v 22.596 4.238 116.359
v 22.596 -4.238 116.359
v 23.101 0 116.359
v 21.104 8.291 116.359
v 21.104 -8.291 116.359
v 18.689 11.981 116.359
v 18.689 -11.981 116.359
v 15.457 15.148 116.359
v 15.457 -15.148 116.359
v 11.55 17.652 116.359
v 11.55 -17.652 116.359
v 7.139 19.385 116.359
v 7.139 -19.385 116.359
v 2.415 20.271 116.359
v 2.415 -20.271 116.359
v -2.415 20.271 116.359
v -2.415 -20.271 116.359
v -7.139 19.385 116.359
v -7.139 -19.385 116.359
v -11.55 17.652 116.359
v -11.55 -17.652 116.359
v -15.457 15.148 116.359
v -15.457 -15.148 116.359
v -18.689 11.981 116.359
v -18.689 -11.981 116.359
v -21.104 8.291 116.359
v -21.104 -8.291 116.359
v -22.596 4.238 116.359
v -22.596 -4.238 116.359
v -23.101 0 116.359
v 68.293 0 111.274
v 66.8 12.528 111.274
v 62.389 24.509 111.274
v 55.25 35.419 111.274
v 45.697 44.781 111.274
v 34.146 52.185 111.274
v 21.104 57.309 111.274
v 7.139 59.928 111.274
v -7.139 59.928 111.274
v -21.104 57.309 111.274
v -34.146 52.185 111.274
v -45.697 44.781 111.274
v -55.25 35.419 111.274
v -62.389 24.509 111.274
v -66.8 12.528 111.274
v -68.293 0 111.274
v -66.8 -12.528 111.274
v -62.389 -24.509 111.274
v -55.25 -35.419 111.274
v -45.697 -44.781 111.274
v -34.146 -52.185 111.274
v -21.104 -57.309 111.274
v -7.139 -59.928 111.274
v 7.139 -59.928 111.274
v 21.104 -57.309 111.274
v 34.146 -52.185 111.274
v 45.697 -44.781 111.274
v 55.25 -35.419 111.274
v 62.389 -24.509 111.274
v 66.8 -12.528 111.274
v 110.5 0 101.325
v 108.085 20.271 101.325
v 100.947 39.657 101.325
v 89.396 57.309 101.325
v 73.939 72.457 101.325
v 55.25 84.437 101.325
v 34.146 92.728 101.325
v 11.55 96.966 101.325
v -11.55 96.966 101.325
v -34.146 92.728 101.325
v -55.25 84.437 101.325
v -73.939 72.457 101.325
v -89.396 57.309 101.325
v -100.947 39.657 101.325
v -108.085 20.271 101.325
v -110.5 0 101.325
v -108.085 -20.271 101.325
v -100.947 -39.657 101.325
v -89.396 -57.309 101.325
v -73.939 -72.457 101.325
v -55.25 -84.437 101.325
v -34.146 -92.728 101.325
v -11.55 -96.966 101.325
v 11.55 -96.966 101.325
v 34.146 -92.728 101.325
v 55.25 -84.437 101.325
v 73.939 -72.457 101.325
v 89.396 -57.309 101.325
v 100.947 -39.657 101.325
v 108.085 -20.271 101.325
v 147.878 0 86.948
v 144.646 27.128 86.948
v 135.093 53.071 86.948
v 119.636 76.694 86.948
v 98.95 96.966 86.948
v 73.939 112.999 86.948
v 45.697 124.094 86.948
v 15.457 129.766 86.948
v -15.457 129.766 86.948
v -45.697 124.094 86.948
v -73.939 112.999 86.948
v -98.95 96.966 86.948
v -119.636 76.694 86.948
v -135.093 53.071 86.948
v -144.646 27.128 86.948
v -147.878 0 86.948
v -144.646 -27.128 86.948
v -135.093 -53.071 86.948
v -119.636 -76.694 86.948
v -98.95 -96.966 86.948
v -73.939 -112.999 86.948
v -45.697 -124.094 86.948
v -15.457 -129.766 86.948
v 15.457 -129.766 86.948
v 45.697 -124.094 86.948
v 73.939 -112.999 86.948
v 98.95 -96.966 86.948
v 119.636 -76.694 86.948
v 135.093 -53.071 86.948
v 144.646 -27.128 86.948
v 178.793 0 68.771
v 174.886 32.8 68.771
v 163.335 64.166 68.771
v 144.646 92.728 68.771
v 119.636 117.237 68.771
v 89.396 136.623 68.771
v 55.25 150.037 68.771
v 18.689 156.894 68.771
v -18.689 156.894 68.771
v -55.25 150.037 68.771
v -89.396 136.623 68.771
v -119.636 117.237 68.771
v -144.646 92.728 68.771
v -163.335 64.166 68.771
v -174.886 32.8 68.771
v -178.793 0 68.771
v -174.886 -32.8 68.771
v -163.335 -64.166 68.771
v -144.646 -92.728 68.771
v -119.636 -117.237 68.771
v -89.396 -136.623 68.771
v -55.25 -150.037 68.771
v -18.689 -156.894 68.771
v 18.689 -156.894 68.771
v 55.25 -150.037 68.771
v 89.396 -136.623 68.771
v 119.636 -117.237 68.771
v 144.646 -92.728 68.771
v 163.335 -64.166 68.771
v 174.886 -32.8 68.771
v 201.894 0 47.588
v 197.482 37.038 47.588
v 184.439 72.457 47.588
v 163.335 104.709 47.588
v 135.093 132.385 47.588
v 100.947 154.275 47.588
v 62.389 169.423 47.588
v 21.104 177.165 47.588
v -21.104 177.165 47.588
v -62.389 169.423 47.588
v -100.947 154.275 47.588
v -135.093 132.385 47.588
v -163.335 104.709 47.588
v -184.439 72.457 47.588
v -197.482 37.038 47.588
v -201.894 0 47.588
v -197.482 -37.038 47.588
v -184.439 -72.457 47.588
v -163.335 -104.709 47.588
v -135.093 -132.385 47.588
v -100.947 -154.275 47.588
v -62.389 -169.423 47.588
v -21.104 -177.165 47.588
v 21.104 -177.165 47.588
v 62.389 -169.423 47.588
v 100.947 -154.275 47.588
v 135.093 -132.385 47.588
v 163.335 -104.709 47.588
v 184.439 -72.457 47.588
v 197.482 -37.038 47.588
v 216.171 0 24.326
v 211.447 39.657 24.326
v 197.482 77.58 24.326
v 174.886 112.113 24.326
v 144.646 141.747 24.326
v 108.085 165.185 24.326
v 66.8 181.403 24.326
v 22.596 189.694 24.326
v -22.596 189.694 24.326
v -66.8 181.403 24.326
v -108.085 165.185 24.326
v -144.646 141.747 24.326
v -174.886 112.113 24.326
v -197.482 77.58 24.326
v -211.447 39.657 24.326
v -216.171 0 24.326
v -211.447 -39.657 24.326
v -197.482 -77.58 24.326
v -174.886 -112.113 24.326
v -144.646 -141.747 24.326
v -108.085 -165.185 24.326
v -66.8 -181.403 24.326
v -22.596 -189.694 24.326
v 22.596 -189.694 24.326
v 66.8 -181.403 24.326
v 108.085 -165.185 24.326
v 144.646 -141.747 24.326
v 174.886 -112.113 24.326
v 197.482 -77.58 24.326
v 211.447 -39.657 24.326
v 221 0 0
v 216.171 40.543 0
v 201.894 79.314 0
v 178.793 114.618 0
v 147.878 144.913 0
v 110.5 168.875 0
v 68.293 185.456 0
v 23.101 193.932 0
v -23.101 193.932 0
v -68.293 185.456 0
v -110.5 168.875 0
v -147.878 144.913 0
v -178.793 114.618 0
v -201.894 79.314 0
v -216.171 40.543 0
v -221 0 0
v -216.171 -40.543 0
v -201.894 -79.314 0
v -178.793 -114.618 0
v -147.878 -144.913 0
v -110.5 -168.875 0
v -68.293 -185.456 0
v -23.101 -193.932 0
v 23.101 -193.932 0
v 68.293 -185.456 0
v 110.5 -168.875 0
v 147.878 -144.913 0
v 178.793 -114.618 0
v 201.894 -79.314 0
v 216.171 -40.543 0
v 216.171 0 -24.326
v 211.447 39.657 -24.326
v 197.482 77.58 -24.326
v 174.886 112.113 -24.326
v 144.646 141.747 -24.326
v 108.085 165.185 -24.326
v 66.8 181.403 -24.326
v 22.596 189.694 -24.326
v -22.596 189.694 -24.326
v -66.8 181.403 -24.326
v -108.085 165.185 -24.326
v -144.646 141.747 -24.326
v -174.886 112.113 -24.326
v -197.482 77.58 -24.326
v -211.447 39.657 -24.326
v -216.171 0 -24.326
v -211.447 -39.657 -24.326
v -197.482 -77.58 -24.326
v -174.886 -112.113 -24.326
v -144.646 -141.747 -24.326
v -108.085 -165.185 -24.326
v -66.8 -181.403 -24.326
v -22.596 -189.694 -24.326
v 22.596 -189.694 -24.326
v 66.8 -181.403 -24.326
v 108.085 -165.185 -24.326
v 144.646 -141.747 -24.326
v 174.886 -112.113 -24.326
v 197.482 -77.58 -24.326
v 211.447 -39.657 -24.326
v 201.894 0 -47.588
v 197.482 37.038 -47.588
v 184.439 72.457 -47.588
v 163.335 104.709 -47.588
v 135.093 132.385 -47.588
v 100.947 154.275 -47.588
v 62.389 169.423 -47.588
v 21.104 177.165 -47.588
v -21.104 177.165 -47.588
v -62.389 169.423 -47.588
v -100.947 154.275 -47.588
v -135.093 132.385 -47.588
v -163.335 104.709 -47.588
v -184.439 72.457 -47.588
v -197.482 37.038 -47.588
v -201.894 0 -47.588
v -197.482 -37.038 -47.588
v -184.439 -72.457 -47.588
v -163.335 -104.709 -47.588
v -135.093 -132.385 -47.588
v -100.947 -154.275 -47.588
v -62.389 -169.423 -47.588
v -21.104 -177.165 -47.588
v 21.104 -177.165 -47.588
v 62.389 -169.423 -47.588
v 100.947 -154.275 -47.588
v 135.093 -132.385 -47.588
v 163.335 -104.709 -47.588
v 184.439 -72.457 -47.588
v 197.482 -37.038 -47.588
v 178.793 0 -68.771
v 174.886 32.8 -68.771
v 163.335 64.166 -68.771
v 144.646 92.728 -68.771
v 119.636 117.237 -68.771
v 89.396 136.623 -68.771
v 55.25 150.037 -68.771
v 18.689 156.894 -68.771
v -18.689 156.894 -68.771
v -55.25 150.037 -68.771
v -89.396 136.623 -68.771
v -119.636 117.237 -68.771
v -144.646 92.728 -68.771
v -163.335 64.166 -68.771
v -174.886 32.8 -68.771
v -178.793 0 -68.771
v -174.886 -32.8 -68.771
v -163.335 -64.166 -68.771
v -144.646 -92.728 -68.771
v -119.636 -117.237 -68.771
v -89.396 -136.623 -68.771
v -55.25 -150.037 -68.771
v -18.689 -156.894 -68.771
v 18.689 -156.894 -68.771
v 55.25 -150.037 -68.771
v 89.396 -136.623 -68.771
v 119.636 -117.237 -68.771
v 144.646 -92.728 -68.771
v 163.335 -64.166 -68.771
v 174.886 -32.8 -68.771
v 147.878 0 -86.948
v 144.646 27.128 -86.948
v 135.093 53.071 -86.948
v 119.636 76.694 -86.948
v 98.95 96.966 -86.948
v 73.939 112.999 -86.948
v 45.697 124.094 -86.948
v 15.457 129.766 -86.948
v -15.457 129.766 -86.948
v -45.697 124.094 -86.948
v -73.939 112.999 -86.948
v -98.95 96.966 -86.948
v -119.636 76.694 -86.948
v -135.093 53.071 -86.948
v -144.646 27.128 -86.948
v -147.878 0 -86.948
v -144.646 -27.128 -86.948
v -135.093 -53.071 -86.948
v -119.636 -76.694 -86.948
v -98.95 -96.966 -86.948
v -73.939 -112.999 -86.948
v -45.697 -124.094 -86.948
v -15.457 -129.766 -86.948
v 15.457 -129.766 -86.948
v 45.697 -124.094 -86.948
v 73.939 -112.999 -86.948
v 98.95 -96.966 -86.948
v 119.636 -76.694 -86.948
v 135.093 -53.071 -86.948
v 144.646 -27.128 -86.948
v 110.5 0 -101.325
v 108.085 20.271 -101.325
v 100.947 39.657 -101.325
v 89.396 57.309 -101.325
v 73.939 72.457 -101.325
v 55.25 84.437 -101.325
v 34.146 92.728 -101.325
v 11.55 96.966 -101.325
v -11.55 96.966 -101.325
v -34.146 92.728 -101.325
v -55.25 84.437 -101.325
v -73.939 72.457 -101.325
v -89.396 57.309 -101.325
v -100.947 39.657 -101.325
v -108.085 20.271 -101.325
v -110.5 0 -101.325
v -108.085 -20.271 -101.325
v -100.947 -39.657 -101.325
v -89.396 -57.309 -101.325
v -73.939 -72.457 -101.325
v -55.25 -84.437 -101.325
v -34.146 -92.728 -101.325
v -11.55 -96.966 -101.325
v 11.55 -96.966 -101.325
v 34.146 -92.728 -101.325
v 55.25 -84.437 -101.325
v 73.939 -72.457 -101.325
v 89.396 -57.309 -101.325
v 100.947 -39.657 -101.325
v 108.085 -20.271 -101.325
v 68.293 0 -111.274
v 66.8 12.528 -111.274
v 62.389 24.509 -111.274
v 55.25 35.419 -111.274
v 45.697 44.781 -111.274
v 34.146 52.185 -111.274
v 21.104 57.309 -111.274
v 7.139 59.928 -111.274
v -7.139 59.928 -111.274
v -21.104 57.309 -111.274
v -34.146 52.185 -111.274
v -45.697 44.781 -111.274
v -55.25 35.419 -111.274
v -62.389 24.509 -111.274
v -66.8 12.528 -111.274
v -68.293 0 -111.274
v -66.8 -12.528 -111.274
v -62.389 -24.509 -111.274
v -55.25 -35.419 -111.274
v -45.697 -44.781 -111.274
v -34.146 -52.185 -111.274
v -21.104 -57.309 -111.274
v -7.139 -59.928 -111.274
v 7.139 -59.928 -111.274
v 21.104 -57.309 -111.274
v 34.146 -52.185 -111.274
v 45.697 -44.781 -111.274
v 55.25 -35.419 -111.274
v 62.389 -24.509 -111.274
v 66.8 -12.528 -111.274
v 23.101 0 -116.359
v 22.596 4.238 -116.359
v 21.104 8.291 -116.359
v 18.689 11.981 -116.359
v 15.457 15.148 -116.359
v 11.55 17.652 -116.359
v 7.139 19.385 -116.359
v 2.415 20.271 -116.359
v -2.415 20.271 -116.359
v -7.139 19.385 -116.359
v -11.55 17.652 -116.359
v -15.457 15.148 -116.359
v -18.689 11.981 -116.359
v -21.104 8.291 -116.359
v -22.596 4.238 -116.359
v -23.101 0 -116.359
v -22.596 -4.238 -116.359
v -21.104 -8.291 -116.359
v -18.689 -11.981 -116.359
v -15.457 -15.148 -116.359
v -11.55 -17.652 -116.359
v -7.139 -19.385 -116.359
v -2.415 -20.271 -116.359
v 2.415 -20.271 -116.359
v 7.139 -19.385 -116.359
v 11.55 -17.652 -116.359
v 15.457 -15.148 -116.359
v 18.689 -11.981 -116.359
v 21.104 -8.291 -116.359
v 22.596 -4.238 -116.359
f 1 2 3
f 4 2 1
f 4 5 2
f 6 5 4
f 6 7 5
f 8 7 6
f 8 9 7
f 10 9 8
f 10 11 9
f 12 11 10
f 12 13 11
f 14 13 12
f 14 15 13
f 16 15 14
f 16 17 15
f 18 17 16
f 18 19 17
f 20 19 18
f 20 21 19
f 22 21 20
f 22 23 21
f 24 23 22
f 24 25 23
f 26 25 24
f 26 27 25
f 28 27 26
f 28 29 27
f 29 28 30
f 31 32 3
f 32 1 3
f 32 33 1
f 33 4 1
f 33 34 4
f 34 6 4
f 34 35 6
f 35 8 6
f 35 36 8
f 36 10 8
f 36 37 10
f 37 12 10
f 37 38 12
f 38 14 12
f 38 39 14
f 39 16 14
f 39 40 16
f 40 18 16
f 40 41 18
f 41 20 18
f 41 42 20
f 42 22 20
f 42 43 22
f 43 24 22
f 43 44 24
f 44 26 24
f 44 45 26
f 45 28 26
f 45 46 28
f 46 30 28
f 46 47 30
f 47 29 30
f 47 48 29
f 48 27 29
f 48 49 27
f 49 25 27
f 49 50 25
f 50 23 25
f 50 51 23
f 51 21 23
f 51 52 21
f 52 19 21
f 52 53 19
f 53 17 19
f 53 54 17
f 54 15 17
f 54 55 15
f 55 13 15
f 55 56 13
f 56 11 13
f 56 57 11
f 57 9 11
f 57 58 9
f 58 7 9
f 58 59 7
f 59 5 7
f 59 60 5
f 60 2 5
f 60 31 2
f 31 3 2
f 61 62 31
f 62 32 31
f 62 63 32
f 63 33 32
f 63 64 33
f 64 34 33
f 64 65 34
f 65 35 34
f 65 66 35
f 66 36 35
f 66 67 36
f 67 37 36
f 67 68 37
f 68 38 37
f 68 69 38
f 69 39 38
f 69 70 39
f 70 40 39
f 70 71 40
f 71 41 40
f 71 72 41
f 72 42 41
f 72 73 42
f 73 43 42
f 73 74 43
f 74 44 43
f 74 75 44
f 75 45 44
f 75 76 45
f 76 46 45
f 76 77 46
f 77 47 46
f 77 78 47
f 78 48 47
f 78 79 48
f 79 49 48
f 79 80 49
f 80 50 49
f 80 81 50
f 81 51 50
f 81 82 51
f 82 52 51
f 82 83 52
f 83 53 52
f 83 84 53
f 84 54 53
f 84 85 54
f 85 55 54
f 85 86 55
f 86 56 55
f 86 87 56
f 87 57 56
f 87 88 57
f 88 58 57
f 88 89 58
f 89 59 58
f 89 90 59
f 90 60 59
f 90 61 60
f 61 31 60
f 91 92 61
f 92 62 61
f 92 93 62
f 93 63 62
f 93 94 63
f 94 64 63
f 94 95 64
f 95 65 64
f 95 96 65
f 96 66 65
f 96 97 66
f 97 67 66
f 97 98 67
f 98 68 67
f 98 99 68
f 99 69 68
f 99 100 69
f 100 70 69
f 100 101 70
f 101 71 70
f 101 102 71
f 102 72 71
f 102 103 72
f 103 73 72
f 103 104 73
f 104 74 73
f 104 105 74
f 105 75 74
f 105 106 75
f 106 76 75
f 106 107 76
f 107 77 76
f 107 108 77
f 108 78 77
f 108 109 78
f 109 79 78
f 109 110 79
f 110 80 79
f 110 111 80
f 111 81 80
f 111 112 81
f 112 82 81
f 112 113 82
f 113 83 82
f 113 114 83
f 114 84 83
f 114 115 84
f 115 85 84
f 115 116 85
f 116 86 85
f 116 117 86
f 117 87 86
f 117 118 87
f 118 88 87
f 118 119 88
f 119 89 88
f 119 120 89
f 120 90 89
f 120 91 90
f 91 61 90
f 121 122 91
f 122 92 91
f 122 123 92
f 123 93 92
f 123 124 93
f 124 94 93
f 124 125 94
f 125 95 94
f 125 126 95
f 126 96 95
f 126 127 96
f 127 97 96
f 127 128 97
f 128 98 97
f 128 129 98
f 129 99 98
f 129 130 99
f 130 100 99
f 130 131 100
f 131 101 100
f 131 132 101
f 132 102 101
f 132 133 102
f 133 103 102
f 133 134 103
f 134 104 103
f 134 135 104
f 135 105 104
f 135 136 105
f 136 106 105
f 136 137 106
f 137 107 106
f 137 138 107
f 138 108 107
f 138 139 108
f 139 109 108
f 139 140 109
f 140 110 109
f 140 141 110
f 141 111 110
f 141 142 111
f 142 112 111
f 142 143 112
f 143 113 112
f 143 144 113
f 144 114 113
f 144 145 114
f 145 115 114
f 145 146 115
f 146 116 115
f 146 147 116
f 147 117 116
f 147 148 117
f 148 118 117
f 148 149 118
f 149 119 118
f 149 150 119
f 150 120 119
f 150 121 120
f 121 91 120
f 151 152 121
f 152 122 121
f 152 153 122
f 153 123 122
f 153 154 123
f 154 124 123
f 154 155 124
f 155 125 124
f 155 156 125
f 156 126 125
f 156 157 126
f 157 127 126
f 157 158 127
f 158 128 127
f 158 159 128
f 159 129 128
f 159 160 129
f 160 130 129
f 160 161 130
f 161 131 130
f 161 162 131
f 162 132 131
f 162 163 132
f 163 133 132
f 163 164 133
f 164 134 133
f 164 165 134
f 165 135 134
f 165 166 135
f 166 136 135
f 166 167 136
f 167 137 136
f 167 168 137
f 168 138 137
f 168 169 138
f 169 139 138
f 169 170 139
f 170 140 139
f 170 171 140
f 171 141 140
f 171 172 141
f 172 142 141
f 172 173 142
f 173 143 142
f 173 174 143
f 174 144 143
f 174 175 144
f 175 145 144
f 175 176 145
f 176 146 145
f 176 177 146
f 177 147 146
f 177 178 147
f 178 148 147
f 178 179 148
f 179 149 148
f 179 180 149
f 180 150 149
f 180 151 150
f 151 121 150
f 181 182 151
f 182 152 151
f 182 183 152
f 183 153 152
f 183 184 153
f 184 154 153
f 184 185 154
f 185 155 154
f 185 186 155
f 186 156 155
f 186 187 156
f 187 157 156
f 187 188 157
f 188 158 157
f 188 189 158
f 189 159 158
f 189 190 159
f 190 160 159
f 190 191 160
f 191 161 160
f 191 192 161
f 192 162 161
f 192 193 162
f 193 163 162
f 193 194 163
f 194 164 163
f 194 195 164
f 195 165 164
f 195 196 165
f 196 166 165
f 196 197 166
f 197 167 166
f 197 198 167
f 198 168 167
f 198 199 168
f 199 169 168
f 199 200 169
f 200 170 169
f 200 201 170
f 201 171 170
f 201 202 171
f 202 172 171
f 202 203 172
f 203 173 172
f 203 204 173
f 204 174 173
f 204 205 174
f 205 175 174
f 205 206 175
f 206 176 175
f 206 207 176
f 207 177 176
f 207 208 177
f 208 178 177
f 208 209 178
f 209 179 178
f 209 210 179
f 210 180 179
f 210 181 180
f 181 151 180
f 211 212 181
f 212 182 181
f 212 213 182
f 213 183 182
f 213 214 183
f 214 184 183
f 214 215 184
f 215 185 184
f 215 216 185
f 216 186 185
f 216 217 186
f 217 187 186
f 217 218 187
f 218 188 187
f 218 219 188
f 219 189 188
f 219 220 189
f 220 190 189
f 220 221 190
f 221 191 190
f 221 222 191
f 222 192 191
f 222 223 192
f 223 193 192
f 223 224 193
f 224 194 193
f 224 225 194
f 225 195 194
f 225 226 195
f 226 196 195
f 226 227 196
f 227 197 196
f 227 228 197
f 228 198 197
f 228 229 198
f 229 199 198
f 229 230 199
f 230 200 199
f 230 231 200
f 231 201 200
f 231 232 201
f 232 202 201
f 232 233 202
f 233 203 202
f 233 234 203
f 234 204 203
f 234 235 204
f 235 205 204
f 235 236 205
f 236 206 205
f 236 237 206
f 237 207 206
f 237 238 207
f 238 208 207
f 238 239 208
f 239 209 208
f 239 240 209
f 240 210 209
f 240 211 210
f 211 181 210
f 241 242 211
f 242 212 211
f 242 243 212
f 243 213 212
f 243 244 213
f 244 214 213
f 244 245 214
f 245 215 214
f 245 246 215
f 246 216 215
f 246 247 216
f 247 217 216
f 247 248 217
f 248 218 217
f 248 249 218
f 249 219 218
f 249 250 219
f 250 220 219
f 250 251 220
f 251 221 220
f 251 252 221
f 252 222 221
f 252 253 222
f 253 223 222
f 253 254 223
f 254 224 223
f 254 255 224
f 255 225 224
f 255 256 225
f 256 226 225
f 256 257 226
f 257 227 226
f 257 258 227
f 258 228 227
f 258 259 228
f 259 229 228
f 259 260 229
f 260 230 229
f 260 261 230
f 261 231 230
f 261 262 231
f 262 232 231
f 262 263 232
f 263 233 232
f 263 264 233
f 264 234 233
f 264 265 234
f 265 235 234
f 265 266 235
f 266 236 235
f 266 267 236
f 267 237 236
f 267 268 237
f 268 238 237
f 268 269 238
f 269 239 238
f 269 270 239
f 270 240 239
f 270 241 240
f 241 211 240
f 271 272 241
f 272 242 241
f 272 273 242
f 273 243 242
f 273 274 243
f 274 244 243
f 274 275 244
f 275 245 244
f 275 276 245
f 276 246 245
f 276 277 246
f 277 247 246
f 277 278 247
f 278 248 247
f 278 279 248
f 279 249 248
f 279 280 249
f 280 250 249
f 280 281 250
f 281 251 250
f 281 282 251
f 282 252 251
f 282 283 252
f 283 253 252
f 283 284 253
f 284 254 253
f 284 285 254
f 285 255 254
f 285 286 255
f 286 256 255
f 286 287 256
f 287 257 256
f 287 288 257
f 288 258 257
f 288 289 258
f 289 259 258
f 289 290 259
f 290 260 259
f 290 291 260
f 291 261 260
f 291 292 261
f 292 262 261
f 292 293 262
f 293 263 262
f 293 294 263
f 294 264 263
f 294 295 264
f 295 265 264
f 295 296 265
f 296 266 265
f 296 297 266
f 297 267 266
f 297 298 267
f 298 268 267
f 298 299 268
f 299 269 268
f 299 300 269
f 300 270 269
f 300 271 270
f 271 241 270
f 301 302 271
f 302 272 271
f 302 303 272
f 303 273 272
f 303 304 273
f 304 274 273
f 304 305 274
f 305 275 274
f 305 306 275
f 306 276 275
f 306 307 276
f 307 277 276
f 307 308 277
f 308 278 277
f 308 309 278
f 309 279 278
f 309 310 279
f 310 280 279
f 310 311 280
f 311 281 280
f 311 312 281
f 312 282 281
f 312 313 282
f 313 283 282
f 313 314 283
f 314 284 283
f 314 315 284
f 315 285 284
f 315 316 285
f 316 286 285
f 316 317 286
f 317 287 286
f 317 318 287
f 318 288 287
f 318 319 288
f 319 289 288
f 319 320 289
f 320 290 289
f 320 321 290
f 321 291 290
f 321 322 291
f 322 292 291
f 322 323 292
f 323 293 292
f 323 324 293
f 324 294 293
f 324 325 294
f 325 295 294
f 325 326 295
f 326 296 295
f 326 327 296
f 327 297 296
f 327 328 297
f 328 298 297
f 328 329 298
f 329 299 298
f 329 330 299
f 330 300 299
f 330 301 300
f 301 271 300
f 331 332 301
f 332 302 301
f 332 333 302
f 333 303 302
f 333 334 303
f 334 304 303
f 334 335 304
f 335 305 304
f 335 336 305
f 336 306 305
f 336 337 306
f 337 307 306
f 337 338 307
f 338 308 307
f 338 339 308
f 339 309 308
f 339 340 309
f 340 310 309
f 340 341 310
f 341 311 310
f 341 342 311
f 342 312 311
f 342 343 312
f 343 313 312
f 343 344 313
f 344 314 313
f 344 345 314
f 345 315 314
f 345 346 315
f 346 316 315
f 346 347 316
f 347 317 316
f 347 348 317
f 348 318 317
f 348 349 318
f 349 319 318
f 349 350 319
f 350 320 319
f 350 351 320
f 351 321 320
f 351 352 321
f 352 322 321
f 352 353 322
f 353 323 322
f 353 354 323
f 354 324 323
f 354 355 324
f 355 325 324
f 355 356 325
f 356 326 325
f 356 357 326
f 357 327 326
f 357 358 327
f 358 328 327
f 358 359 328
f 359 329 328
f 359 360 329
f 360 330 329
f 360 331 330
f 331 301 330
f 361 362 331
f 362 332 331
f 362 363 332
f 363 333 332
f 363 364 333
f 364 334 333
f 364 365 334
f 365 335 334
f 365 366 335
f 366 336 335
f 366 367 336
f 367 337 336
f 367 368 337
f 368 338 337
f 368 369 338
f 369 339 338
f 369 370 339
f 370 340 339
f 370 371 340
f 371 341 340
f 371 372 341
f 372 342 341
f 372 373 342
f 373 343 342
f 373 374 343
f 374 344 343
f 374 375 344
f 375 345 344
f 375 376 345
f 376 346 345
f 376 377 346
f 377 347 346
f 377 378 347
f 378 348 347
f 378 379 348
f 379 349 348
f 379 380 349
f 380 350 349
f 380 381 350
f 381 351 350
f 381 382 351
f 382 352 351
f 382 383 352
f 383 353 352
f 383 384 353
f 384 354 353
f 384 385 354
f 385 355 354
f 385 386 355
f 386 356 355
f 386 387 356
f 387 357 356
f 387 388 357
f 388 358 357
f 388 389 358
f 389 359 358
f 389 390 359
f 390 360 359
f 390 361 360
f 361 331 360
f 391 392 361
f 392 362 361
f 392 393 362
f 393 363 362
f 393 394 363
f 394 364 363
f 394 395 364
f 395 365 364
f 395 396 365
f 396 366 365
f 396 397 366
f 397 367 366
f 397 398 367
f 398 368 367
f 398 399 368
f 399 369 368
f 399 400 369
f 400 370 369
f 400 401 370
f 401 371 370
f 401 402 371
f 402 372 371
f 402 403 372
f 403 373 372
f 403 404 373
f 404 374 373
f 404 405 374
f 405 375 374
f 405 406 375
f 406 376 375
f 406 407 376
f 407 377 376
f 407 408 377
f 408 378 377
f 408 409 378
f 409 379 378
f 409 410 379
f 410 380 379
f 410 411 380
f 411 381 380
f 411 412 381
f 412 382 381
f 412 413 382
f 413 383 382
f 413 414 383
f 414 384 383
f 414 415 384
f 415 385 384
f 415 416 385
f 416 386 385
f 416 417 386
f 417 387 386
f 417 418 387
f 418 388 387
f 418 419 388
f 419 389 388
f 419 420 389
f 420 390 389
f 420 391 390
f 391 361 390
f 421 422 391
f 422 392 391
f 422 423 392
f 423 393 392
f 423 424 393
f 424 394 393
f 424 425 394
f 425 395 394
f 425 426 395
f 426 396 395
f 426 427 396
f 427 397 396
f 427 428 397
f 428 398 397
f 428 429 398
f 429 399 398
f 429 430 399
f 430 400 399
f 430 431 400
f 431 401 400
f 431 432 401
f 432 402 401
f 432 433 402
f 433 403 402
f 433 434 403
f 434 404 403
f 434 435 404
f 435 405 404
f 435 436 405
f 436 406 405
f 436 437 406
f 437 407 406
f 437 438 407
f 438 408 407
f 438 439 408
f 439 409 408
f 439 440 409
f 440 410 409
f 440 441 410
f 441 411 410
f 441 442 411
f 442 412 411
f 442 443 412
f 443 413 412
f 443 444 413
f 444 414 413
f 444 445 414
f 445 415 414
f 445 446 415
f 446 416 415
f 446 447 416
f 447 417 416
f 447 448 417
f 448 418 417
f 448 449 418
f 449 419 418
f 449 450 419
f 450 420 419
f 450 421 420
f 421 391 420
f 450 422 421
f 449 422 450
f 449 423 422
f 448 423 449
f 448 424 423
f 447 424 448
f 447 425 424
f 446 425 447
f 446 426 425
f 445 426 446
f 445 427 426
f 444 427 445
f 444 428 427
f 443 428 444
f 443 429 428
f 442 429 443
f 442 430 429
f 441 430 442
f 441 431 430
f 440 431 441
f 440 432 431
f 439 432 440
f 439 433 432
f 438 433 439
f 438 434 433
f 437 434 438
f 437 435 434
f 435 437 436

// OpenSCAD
// Generated by SolidPython 1.0.1 on 2020-07-29 00:46:53


scale(v = [17, 15, 9]) {
	sphere(r = 13);
}
/***********************************************
*********      SolidPython code:      **********
************************************************
 
# import packages: SolidPython
from solid import *
from solid.utils import *
from itertools import chain, combinations, permutations


class Resize:

    def __init__(self, scad_file):
        self.scad_file = scad_file
        #self.scad_file = import_scad(scad_file)
        # cone/cylinder param:
        self.r1 = 0
        self.r2 = 0
        self.h = 0
        # rectangular prism param:
        self.w = 0
        self.l = 0
        # ellipse param:
        self.r = 0

    # import OpenScad code (file name corresponds to shape)


    # classify shape + parameters
    def assign(self, param1, param2, param3):
        if self.scad_file == 'cone.scad':
            self.r1 = param1
            self.r2 = param2
            self.h = param3
        elif self.scad_file == 'cylinder.scad':
            self.r1 = param1
            self.r2 = param2
            self.h = param3
        elif self.scad_file == 'rectangularPrism.scad':
            self.h = param1
            self.l = param2
            self.w = param3
        else:
            self.r = param1
            self.h = param2

    # resize parameters
    def iterate(self):
        x = range(3, 20, 2)
        i = 1
        if self.scad_file == 'cone.scad':
            tempList = list(permutations(x, 2))
            for temp in tempList:
                param1 = temp[0]
                param2 = temp[1]
                filepath = 'produced_scad_files/' + 'cone' + str(param1) + '_' + str(param2) + '_' + '.scad'
                scad_render_to_file(cylinder(h=param1, r1=param2, r2=0), filepath)

        elif self.scad_file == 'cylinder.scad':
            tempList = list(permutations(x, 3))
            for temp in tempList:
                param1 = temp[0]
                param2 = temp[1]
                filepath = 'produced_scad_files/' + 'cylinder' + str(param1) + '_' + str(param2) + '_' + '.scad'
                scad_render_to_file(cylinder(h=param1, r1=param2, r2=param2), filepath)

        elif self.scad_file == 'rectangularPrism.scad':
            tempList = list(permutations(x, 3))
            for temp in tempList:
                param1 = temp[0]
                param2 = temp[1]
                param3 = temp[2]
                filepath = 'produced_scad_files/' + 'rectangularPrism' + str(param1) + '_' + str(param2) + '_' + str(
                    param3) + '.scad'
                scad_render_to_file(cube(size=(param1, param2, param3)), filepath)

        elif self.scad_file == 'ellipse.scad':
            tempList = list(permutations(x, 4))
            for temp in tempList:
                param1 = temp[0]
                param2 = temp[1]
                param3 = temp[2]
                param4 = temp[3]
                filepath = 'produced_scad_files/' + 'ellipse' + str(param1) + '_' + str(param2) + '_' + str(param3) + '_' + str(param4) + '.scad'
                scad_render_to_file(scale([param1, param2, param3])(sphere(r=param4)), filepath)

    def render_to_scadfile(self):
        scad_render_to_file(scad, 'example.scad') 
 
************************************************/
